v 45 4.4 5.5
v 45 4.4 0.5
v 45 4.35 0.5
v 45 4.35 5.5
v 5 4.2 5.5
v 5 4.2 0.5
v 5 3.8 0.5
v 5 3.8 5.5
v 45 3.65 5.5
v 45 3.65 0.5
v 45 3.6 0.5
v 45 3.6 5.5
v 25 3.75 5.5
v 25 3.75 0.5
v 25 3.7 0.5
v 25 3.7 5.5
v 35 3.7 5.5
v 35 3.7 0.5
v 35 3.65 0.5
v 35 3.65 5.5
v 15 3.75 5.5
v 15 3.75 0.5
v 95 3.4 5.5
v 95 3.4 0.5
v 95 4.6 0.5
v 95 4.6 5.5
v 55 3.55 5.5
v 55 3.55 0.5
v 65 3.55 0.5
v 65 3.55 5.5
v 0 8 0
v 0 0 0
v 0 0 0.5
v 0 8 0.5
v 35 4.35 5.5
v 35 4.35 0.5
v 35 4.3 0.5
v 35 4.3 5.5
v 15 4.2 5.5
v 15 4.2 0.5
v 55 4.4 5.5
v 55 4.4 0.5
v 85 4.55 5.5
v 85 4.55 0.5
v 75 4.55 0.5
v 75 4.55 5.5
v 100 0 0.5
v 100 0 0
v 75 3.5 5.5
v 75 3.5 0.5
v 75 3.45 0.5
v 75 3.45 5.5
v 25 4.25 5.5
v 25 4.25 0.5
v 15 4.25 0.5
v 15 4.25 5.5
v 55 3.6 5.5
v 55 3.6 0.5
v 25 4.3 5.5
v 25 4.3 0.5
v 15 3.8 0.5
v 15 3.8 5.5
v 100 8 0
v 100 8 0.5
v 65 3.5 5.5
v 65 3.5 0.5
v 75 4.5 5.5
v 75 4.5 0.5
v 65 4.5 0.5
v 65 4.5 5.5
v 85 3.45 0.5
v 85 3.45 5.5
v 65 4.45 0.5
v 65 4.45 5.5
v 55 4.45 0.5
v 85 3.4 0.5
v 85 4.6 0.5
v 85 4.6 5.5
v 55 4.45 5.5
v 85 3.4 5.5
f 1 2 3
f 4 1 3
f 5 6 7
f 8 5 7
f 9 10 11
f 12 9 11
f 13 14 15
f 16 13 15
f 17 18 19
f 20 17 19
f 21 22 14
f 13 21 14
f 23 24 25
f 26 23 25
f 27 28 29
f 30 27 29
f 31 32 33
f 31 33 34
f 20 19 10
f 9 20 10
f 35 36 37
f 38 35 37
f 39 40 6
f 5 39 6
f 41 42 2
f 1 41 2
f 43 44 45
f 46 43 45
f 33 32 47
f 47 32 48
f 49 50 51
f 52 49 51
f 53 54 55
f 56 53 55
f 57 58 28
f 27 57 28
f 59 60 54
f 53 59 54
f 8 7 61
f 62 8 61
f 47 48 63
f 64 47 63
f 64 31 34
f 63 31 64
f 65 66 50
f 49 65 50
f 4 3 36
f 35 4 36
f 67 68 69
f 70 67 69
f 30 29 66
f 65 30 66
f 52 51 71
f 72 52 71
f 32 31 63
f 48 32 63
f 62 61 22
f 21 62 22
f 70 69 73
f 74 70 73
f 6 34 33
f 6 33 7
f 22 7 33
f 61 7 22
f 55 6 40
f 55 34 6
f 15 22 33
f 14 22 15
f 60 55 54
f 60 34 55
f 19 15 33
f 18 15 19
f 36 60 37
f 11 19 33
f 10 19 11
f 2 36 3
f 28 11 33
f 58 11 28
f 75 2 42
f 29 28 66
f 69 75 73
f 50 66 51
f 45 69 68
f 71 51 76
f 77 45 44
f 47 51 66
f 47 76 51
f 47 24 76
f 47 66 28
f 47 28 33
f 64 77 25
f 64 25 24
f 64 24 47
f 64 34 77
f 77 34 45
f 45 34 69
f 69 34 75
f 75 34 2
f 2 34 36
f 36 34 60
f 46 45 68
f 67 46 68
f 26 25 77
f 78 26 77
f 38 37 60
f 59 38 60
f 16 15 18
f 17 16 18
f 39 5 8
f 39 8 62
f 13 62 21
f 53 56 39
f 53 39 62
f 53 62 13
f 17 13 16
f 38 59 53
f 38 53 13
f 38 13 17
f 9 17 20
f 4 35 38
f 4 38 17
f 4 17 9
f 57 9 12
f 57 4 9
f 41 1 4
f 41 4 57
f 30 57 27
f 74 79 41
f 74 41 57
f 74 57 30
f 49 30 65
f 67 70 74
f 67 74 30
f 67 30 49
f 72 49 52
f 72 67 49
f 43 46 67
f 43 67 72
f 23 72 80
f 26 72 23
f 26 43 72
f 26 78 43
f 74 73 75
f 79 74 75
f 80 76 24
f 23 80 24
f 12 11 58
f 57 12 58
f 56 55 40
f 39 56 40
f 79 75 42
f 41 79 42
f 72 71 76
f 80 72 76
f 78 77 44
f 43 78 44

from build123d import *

# Parameters (mm, degrees)
SKETCH_W     = 100
SKETCH_H     = 8
PAD_DEPTH    = 0.5
PAD001_DEPTH = 5


with BuildPart() as part:
    # Sketch → Pad (new body)
    with BuildSketch(Plane.XY):
        with Locations((50, 4)):
            Rectangle(SKETCH_W, SKETCH_H)
    extrude(amount=PAD_DEPTH)

    # Sketch001 (on Face6 of Pad) → Pad001 (join)
    with BuildSketch(Plane.XY.offset(0.5)):
        Polygon((5, 4.2), (5, 3.8), (15, 3.8), (15, 3.75), (25, 3.75), (25, 3.7), (35, 3.7), (35, 3.65), (45, 3.65), (45, 3.6), (55, 3.6), (55, 3.55), (65, 3.55), (65, 3.5), (75, 3.5), (75, 3.45), (85, 3.45), (85, 3.4), (95, 3.4), (95, 4.6), (85, 4.6), (85, 4.55), (75, 4.55), (75, 4.5), (65, 4.5), (65, 4.45), (55, 4.45), (55, 4.4), (45, 4.4), (45, 4.35), (35, 4.35), (35, 4.3), (25, 4.3), (25, 4.25), (15, 4.25), (15, 4.2), align=None)
    extrude(amount=PAD001_DEPTH)


solid = part.part
